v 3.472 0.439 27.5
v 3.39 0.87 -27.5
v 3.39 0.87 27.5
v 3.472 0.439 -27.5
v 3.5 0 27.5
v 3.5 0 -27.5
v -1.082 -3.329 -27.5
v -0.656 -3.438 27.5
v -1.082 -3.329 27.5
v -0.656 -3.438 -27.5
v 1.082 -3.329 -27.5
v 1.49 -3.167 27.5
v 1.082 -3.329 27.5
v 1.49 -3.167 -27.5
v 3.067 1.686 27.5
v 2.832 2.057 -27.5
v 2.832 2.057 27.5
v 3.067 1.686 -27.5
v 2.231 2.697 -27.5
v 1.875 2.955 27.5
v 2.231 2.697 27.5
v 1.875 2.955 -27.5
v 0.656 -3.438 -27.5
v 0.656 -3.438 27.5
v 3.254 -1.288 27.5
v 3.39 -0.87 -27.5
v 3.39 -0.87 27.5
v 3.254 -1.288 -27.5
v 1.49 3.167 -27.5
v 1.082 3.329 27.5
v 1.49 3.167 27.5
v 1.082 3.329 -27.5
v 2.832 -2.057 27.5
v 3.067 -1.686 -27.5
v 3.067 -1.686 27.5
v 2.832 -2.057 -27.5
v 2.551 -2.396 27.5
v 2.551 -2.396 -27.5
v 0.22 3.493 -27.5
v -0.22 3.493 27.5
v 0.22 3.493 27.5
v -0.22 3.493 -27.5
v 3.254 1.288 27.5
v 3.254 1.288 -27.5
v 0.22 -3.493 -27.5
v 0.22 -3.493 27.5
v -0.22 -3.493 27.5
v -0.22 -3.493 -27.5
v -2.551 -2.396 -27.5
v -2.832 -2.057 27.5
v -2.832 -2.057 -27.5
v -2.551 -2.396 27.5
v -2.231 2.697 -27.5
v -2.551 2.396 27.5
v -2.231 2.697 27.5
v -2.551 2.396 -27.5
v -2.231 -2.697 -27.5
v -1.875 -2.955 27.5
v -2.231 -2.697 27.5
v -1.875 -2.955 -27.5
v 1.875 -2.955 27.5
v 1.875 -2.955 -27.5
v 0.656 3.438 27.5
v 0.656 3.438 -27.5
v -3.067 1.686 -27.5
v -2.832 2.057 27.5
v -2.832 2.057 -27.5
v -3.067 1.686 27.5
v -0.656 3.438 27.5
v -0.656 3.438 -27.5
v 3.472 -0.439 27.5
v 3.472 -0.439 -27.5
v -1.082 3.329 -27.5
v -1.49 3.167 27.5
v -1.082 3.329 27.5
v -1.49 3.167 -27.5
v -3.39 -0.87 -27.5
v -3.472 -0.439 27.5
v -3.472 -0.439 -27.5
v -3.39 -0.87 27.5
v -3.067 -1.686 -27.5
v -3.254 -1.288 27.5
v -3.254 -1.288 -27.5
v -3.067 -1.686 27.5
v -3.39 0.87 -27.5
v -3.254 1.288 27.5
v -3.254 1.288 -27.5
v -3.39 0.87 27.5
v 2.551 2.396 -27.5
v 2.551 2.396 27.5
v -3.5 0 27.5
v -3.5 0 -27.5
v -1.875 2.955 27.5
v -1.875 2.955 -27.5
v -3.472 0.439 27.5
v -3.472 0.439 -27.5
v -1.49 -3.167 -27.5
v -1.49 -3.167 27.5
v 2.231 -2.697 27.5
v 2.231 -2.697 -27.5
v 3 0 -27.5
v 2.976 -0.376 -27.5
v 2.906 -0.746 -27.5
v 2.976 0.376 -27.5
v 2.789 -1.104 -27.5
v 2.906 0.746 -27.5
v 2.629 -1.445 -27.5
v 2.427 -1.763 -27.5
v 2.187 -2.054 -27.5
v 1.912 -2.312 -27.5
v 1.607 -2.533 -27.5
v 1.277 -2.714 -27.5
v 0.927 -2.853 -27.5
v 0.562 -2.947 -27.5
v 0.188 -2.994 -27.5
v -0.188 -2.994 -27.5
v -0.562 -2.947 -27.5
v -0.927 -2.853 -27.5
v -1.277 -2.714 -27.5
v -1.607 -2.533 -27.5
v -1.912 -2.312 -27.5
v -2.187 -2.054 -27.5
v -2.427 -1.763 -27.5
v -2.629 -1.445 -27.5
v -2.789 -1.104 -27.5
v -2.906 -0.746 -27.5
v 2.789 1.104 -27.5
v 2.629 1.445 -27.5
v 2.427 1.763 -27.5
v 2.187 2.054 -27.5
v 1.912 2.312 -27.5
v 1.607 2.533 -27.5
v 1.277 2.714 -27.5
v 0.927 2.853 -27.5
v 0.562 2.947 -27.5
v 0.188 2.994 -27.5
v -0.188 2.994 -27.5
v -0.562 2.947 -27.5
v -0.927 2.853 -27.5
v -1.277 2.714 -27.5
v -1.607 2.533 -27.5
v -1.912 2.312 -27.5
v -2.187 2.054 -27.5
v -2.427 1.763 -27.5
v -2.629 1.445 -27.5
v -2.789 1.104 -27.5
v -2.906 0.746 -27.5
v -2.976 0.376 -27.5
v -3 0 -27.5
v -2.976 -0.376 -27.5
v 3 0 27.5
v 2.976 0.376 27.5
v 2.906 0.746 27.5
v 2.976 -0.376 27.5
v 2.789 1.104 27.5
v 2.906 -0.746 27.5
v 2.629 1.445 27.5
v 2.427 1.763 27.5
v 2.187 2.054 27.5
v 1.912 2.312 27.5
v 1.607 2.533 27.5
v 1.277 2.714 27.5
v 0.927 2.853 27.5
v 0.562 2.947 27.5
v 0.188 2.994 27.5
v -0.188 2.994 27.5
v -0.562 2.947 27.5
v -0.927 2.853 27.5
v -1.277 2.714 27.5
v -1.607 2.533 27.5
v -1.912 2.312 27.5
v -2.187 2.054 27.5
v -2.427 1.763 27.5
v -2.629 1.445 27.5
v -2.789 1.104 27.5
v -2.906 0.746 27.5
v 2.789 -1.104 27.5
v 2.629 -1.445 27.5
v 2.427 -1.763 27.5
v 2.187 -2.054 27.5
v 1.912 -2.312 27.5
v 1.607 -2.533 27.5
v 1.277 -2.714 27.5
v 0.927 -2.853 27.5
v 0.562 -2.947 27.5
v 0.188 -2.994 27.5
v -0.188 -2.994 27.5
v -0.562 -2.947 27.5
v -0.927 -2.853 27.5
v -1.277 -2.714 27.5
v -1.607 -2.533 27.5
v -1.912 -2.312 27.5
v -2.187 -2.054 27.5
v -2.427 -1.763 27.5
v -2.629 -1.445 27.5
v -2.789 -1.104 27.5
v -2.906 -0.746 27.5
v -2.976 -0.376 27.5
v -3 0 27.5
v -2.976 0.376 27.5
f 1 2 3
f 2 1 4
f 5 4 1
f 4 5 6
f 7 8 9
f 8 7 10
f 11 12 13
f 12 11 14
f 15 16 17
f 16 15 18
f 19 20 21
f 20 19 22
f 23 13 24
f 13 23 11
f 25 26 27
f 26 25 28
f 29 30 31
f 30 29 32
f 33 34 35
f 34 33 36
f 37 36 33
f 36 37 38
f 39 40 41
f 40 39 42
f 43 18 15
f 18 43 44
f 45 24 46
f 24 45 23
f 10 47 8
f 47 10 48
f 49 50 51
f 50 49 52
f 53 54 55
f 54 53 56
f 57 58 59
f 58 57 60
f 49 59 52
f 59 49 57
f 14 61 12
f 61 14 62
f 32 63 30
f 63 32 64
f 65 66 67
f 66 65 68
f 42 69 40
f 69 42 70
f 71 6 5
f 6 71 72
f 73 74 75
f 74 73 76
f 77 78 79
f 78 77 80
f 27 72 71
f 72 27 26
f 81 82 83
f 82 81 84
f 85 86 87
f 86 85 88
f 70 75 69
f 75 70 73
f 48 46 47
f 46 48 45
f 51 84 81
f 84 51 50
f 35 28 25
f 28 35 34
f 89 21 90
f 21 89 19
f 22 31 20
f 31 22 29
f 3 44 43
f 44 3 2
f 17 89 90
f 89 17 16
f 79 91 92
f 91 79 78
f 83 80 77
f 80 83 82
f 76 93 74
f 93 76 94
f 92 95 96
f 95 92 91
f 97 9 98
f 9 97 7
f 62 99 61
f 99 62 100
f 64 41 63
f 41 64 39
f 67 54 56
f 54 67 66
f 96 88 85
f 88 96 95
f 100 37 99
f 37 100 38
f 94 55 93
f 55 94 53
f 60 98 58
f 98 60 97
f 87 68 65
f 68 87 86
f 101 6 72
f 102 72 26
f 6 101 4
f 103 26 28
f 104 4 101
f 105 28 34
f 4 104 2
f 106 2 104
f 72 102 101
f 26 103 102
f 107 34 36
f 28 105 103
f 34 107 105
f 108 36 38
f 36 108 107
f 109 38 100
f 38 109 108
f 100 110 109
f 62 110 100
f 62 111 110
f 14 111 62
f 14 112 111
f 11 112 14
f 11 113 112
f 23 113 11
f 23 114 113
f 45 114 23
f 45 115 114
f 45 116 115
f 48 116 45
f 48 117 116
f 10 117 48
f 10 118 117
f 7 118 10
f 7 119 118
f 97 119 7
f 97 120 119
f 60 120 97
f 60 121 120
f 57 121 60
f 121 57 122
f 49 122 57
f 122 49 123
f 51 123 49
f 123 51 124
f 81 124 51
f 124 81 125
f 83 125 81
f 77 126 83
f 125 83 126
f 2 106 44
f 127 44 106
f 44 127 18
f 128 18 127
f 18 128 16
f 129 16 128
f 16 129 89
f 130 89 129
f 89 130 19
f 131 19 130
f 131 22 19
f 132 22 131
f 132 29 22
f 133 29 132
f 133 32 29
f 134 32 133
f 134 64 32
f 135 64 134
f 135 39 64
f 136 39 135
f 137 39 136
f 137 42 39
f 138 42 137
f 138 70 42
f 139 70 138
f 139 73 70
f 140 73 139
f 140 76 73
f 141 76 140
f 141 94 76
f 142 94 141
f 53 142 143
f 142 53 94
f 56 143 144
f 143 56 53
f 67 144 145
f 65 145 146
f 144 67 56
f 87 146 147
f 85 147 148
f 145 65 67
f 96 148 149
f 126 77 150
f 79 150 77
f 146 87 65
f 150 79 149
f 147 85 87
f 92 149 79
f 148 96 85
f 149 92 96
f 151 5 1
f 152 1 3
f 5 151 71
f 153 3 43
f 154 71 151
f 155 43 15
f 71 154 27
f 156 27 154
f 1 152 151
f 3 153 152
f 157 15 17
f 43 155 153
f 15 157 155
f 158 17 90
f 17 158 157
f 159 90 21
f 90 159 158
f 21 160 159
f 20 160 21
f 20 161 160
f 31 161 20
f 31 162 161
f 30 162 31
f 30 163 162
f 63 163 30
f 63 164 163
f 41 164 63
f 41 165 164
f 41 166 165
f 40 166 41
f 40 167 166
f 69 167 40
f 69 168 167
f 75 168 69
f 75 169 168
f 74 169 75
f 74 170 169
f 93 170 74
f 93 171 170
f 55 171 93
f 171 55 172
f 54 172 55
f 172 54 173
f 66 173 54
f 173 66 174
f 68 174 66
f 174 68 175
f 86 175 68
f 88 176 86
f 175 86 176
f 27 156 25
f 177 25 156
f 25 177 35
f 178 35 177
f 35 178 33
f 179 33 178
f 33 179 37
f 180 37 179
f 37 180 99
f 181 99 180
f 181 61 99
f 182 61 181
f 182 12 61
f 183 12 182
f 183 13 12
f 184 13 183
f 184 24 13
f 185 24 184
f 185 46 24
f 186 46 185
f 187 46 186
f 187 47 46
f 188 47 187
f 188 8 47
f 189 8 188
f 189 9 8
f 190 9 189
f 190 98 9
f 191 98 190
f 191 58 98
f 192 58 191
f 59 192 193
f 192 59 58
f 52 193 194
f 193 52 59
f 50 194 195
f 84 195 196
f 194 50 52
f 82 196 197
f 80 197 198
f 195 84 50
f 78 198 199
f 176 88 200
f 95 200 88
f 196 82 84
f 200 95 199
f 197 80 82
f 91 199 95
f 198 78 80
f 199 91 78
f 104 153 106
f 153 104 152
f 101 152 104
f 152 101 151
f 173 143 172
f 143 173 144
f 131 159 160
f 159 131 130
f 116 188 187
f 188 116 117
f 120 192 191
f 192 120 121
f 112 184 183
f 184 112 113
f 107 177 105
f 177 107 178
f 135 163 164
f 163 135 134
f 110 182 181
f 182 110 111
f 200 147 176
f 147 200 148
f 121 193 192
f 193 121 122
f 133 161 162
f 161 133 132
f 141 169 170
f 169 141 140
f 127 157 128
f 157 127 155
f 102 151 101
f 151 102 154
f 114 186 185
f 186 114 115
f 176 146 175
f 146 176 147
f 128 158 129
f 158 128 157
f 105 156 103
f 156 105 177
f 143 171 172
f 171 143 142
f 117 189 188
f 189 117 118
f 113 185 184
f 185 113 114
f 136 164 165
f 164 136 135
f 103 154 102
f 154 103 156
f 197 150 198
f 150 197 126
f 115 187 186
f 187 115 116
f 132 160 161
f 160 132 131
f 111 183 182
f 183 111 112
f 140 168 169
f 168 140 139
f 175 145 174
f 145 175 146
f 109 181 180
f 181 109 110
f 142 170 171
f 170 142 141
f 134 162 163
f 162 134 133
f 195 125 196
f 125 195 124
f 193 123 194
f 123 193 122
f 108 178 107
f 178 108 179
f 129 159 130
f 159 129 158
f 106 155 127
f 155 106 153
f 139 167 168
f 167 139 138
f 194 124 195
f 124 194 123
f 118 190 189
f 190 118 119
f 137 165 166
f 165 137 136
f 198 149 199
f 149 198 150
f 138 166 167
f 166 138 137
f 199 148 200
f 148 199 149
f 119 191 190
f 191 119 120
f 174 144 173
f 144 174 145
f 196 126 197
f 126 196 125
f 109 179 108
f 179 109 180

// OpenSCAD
$fn = 50;


difference() {
	union() {
		translate(v = [0, 0, -27.5000000000]) {
			cylinder(h = 55, r = 3.5000000000);
		}
	}
	union() {
		translate(v = [0, 0, -100.0000000000]) {
			cylinder(h = 200, r = 3.0000000000);
		}
	}
}
